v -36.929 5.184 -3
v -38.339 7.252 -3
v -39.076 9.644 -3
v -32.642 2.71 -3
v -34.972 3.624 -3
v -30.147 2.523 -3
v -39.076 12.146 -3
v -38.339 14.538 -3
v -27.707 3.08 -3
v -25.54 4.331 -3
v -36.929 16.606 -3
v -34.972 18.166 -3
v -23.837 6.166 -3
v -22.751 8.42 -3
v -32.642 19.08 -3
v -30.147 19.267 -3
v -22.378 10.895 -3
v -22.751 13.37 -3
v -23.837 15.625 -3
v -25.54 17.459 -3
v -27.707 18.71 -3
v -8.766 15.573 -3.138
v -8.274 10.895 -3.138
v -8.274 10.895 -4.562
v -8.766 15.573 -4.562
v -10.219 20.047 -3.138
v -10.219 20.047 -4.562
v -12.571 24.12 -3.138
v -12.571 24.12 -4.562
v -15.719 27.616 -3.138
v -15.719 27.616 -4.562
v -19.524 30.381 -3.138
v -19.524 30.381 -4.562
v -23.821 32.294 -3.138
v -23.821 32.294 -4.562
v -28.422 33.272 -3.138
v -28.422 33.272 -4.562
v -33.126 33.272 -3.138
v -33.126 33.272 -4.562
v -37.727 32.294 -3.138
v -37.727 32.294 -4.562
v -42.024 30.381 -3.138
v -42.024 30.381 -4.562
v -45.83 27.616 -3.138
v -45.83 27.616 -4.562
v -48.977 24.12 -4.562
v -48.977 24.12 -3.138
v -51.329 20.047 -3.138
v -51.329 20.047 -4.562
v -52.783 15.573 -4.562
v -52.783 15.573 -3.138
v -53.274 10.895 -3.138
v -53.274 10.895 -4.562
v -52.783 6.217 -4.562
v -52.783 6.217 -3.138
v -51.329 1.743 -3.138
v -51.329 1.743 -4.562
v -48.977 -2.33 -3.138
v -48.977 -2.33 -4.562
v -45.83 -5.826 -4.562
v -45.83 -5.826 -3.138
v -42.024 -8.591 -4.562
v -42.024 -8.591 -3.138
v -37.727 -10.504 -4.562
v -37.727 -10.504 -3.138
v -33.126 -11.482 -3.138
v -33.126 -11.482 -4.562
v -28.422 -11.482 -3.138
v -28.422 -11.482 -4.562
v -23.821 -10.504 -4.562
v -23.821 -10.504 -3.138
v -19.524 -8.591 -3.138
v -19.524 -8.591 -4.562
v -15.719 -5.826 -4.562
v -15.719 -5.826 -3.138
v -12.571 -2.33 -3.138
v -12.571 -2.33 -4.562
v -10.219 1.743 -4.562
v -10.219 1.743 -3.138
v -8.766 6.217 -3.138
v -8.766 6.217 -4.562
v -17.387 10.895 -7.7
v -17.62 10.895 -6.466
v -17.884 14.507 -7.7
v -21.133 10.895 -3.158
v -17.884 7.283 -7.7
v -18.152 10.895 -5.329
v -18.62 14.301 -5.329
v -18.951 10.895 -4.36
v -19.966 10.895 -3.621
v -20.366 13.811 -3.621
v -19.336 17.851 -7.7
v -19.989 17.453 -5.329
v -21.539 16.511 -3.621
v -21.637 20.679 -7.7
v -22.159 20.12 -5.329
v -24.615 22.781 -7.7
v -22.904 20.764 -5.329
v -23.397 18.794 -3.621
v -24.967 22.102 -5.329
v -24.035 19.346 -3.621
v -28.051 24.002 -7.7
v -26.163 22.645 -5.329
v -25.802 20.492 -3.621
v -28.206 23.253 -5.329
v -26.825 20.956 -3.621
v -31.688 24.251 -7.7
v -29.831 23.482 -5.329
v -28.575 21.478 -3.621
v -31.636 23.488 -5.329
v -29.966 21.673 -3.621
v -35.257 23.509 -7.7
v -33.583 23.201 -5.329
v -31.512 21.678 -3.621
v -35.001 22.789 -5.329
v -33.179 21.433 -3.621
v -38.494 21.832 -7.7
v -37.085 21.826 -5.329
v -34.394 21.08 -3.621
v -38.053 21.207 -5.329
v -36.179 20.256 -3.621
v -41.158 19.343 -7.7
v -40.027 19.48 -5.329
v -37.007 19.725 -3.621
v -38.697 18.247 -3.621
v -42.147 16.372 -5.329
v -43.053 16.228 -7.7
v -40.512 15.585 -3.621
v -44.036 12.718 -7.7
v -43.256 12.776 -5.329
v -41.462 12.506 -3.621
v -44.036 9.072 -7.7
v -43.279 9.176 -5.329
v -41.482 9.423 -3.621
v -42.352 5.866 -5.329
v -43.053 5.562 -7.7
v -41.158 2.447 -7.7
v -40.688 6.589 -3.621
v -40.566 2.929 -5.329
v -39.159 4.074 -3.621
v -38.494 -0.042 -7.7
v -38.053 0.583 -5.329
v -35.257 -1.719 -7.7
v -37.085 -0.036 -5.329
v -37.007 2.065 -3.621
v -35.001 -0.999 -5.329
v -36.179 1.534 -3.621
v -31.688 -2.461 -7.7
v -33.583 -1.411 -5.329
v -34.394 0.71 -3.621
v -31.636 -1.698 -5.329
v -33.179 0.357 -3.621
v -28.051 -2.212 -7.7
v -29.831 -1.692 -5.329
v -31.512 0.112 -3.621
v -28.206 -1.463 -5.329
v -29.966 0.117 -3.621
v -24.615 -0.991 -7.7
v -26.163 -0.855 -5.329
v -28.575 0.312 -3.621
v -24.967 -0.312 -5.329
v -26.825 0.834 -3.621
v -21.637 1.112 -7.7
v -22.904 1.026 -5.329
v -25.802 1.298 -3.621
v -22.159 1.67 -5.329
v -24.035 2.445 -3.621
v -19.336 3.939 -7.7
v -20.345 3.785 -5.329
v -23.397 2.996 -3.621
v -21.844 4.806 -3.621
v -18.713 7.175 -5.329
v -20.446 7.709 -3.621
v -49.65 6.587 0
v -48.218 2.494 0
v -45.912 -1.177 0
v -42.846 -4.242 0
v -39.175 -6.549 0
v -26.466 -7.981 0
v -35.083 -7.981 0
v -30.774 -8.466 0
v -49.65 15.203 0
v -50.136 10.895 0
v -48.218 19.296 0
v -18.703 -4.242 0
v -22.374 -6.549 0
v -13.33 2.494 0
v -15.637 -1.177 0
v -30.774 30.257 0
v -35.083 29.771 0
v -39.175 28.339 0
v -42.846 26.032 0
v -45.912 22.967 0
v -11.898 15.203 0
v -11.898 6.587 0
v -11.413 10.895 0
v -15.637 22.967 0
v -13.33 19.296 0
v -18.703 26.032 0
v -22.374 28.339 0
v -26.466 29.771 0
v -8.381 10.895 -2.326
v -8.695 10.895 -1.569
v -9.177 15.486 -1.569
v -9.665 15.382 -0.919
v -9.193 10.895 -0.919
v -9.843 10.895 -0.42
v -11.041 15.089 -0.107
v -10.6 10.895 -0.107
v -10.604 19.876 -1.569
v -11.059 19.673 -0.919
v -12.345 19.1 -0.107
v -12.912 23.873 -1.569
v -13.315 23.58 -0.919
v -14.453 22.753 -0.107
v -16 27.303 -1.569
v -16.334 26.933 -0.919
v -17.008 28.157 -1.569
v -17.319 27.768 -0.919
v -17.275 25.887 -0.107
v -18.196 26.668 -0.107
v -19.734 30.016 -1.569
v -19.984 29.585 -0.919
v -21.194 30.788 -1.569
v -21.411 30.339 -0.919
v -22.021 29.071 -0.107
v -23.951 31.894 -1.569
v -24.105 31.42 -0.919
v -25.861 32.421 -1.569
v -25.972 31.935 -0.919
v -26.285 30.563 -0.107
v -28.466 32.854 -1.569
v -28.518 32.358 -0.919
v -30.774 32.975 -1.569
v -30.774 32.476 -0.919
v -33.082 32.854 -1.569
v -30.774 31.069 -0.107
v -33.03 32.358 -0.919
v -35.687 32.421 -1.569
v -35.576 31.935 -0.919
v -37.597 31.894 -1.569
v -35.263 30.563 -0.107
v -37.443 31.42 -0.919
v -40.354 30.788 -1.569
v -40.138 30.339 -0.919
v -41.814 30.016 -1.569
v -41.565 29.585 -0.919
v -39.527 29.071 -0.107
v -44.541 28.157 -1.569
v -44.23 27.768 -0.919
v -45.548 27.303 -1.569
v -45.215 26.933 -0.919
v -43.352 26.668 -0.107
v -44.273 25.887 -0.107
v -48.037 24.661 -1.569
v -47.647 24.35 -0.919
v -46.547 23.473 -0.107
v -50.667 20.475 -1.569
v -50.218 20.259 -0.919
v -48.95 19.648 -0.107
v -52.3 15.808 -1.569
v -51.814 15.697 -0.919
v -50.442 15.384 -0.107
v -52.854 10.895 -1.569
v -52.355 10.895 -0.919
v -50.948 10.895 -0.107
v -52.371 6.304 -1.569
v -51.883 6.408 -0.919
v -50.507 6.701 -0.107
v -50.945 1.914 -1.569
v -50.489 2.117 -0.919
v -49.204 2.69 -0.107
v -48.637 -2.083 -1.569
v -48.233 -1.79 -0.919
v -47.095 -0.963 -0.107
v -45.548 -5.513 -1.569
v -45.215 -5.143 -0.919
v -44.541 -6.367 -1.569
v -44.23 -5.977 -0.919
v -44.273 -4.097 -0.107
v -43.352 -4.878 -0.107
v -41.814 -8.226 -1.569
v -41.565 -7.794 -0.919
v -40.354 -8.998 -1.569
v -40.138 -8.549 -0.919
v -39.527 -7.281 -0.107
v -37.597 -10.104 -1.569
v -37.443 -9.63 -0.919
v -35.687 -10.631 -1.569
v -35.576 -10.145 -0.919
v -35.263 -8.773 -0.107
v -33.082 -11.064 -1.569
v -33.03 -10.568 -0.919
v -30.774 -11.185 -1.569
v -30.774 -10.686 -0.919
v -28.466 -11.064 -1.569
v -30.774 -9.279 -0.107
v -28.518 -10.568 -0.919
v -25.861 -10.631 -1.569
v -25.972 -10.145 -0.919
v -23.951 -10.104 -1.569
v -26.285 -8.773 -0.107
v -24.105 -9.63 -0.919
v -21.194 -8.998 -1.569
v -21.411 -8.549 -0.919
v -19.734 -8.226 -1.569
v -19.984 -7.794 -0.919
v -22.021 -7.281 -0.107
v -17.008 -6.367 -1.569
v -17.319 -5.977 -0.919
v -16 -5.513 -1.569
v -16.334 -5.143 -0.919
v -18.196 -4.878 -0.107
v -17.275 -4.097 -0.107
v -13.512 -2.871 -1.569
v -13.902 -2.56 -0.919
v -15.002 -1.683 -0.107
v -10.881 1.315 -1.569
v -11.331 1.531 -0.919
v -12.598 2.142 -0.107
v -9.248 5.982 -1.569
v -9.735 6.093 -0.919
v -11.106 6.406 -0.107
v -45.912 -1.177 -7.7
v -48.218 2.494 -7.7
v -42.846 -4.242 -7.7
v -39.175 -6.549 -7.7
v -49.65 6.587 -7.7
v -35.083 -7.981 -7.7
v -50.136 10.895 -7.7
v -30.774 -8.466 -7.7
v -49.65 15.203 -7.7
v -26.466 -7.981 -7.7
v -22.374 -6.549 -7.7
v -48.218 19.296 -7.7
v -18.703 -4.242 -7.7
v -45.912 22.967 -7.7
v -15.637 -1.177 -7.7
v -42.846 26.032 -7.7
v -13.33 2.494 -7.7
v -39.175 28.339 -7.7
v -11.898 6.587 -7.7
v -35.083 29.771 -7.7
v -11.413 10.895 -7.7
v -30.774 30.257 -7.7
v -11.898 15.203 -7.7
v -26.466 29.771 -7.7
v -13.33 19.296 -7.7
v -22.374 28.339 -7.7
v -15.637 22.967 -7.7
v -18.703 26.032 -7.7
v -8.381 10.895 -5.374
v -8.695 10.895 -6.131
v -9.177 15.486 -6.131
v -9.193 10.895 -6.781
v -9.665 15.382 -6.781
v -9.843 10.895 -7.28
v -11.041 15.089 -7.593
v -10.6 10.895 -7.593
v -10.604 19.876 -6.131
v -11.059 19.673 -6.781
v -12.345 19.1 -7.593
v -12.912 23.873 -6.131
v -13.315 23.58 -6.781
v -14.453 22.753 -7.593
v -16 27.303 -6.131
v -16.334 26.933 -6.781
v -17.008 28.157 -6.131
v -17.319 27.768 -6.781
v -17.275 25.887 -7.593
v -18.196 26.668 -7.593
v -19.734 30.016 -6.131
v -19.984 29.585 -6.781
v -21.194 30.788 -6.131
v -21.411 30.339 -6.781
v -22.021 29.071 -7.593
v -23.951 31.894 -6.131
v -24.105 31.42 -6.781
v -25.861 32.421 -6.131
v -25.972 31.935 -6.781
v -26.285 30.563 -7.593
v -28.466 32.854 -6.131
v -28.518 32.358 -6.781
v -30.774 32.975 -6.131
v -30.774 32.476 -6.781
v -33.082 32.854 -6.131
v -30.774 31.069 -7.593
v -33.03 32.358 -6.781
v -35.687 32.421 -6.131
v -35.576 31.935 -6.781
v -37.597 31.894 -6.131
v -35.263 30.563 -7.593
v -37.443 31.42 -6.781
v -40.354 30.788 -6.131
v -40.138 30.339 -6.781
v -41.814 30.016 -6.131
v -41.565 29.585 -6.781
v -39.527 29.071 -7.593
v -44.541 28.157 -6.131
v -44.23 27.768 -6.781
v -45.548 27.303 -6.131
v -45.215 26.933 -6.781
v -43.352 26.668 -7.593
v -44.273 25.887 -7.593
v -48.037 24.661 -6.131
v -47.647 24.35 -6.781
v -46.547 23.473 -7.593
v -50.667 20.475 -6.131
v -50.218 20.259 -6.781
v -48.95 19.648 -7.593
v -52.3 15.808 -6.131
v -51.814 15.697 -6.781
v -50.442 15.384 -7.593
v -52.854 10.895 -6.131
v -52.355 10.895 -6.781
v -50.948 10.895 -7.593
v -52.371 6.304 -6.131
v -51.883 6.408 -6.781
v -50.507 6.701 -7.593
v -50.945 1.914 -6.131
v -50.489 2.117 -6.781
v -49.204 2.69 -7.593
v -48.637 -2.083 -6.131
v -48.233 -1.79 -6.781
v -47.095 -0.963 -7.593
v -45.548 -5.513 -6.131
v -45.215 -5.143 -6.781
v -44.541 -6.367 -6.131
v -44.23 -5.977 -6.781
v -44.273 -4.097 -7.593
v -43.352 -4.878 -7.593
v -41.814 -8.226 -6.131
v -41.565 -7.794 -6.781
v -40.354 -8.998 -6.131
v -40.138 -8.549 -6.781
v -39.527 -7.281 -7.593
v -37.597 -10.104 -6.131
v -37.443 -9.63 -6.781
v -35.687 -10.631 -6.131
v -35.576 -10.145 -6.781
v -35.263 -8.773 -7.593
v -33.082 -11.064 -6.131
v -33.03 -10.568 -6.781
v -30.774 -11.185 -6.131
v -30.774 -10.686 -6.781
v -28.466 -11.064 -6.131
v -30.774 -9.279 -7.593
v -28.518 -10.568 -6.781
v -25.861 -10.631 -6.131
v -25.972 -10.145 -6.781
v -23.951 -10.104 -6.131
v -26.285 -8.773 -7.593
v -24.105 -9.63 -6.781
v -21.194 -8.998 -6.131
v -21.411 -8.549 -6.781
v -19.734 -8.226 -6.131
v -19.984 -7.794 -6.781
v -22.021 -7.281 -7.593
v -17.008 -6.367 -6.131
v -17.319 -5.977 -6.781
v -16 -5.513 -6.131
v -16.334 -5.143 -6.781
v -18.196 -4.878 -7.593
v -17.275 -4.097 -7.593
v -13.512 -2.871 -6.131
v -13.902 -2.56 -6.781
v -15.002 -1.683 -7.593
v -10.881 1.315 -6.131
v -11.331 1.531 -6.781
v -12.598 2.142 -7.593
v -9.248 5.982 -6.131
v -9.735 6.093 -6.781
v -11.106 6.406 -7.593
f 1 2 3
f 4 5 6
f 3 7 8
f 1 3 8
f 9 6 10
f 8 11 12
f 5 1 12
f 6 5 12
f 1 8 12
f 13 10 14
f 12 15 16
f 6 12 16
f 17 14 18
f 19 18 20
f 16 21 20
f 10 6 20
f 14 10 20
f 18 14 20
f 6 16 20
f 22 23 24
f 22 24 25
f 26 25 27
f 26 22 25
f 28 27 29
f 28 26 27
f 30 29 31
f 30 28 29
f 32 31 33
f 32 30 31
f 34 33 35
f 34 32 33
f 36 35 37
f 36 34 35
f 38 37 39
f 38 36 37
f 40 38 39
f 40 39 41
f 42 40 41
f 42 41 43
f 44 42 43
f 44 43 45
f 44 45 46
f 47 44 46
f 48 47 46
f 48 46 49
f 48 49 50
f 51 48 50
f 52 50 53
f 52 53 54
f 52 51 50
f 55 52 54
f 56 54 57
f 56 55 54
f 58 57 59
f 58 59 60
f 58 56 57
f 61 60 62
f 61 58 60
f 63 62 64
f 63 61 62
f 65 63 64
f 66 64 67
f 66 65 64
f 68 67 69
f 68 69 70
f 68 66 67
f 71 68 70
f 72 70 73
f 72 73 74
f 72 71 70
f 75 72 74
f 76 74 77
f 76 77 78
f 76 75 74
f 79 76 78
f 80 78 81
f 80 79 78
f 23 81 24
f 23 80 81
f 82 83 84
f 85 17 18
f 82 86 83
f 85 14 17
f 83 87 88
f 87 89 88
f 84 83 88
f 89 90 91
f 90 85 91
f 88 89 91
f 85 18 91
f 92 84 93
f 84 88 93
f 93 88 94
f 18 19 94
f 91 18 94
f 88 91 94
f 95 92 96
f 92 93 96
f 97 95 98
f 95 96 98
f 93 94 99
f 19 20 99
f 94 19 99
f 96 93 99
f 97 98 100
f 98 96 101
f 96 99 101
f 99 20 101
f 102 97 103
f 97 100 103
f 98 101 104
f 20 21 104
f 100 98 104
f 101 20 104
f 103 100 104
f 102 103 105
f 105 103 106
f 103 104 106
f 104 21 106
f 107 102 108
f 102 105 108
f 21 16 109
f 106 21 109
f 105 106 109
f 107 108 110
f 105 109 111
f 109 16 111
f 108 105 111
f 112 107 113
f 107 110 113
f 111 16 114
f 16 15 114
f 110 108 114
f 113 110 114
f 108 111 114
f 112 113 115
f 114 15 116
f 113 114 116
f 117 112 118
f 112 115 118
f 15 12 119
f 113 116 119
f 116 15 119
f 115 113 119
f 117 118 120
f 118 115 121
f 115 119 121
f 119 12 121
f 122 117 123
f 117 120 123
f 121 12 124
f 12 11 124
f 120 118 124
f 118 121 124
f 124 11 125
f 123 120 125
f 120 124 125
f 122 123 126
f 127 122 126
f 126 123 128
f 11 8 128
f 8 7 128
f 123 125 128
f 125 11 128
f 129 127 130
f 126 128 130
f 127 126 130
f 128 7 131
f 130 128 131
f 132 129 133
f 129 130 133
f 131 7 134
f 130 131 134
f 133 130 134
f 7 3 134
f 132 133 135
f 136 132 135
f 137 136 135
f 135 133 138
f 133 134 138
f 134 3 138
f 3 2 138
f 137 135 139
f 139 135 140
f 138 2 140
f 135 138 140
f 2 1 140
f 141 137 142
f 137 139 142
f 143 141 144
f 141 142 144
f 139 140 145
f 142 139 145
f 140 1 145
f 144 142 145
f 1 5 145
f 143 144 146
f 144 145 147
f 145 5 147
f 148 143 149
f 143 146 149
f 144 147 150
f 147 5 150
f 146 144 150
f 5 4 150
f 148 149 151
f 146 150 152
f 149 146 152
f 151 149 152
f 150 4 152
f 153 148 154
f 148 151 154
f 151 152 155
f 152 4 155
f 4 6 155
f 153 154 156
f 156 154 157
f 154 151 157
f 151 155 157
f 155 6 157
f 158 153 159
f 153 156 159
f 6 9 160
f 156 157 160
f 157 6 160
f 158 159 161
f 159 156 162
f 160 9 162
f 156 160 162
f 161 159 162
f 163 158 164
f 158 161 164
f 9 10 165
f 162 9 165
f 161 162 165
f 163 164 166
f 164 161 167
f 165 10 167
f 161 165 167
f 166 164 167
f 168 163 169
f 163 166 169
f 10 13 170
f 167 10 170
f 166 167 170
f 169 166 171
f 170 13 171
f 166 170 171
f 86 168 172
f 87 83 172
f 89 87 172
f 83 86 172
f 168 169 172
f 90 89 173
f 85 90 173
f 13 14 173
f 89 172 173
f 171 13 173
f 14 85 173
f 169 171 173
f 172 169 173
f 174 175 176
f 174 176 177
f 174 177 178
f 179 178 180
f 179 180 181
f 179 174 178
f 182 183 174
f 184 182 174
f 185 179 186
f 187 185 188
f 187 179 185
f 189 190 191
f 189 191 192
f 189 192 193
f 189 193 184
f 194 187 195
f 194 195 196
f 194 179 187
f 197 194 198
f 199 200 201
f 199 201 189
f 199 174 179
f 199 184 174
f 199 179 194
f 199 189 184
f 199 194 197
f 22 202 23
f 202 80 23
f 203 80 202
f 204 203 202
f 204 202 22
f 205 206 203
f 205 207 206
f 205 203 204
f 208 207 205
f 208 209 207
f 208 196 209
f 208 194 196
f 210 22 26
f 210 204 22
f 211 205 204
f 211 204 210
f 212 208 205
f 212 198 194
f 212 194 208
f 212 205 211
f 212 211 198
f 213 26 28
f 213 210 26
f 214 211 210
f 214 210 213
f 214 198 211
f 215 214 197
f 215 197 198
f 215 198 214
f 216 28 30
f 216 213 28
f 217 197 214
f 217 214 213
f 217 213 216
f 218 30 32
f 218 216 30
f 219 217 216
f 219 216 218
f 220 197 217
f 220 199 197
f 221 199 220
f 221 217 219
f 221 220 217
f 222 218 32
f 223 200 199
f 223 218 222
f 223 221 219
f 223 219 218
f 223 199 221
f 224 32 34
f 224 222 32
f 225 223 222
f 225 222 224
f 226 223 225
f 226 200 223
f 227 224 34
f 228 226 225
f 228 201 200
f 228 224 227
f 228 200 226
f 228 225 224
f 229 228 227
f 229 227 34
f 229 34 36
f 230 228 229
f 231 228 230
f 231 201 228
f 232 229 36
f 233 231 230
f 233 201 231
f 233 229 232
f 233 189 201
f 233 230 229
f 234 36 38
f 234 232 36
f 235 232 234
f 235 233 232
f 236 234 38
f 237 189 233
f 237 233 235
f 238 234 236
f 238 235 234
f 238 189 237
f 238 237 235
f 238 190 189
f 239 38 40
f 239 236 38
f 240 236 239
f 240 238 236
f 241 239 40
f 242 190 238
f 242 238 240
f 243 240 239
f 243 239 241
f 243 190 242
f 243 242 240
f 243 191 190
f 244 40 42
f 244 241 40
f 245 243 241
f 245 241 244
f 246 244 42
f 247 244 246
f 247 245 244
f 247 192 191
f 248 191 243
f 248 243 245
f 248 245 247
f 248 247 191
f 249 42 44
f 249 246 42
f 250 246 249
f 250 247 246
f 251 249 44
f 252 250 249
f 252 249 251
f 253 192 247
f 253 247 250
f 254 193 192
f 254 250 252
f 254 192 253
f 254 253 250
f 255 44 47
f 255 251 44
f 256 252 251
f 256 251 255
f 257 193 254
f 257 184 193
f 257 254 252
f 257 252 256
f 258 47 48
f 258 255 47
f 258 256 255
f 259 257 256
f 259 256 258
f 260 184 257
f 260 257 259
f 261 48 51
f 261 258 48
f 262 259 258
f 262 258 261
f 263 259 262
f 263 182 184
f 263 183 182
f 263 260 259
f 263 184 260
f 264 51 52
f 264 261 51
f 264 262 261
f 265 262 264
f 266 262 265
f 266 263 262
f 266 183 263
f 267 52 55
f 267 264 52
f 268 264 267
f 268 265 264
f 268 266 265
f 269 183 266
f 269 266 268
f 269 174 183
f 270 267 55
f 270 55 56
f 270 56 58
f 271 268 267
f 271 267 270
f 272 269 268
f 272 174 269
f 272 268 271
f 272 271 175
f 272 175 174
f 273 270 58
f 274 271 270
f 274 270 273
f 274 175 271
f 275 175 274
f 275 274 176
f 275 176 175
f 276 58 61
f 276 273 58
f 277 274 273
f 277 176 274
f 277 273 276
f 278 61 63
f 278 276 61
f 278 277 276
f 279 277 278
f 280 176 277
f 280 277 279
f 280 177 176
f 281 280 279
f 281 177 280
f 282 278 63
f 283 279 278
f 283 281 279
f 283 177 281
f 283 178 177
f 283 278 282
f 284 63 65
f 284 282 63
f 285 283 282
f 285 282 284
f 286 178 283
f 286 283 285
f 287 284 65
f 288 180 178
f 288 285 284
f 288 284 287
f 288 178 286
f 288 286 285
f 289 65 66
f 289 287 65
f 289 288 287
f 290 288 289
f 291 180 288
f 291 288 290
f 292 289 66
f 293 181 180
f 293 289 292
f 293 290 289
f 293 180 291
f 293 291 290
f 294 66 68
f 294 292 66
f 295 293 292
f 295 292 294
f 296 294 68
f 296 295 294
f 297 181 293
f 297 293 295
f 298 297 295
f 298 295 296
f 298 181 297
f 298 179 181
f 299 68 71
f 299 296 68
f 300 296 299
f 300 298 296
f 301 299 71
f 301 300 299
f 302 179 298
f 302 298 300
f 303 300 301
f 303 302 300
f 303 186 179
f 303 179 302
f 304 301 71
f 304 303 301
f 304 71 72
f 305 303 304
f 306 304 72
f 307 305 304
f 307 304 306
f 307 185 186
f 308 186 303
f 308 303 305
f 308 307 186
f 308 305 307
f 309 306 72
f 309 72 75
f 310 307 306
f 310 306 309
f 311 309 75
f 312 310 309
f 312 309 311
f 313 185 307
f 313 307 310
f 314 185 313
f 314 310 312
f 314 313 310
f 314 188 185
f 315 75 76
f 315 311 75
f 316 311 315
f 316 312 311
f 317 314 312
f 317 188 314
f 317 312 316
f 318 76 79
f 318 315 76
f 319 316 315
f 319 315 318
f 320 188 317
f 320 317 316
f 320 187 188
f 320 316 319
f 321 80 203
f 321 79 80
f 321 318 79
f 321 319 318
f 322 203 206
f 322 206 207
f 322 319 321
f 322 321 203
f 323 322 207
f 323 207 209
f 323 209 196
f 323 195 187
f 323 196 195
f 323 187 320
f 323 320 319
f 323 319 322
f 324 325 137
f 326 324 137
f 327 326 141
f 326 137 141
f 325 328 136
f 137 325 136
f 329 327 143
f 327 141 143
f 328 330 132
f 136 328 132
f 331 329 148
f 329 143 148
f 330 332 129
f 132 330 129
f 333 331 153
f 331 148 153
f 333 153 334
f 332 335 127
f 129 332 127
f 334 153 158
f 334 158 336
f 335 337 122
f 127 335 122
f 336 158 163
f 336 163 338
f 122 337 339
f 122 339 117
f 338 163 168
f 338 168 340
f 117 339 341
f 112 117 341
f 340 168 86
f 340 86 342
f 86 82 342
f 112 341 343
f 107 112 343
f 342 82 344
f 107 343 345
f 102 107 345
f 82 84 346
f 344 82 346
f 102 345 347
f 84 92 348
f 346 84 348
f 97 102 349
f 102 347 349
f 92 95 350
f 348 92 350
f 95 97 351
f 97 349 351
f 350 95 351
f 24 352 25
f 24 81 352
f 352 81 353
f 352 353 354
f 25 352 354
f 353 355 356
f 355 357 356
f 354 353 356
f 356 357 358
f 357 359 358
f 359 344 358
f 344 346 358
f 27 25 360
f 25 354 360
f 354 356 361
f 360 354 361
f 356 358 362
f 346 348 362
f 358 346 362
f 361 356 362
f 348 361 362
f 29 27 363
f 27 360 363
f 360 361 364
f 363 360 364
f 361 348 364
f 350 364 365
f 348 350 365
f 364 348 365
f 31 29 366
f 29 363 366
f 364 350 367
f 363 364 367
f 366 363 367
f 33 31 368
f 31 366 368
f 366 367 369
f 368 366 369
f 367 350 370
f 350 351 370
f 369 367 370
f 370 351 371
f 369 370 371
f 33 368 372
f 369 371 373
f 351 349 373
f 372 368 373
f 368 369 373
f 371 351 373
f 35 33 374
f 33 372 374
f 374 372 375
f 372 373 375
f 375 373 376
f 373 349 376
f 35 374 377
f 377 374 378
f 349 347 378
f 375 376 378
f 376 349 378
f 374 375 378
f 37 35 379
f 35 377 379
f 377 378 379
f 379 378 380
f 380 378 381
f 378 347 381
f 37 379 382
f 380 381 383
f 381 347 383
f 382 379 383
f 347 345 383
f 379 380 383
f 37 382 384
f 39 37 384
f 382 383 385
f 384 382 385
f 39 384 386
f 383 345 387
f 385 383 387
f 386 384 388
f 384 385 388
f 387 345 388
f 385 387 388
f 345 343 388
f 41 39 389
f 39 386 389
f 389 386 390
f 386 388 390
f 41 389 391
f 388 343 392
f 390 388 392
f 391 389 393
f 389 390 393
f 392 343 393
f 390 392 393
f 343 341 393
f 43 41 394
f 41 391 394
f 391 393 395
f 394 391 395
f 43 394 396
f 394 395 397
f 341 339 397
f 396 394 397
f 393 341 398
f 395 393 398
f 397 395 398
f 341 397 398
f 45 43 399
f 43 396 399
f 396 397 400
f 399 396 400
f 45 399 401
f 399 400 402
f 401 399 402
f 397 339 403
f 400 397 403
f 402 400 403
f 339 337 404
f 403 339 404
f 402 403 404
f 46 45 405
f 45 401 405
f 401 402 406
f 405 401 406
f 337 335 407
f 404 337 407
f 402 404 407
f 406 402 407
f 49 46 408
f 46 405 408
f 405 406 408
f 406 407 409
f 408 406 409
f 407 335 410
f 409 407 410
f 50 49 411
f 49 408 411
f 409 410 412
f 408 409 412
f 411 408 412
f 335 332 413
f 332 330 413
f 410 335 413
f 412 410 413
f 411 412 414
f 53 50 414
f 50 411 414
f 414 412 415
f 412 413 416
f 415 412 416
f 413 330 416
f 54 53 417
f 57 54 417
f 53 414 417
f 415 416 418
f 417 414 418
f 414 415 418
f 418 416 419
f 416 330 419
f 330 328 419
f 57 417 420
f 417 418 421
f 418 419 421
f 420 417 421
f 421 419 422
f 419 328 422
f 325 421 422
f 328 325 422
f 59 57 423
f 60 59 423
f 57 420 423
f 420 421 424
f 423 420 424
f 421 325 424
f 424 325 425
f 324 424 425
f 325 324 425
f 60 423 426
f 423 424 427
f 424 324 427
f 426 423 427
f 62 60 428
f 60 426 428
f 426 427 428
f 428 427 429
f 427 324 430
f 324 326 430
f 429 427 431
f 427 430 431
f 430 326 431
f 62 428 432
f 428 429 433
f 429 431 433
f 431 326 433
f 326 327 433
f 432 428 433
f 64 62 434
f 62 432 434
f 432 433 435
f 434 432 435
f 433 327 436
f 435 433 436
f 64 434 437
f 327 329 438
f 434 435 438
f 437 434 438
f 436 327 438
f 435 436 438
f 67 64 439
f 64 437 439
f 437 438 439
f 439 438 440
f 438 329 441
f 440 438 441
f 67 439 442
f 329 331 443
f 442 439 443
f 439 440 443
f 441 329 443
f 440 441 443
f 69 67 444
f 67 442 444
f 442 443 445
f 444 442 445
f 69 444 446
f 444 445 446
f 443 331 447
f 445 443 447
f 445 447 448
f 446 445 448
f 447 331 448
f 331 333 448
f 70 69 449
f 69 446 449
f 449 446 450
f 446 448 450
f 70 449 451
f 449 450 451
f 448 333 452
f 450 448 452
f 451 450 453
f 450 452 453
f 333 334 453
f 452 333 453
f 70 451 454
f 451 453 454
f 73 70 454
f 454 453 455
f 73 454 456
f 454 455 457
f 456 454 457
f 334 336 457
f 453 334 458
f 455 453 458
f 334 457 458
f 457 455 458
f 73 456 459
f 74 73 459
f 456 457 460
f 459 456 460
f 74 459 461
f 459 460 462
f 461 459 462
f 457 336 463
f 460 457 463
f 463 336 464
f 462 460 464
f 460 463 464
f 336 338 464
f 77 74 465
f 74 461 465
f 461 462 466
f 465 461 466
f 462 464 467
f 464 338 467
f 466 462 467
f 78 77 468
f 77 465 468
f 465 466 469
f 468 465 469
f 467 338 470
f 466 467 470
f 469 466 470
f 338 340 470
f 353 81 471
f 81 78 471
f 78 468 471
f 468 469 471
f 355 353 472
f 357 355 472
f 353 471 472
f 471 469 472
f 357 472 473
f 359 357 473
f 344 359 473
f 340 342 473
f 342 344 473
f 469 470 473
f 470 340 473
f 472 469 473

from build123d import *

# Parameters (mm, degrees)
F0_R     = 22.5
F0_R_2   = 13.3867529453
F1_DEPTH = 7.7
F2_R     = 3.1384776311
F3_DEPTH = 3


# Not quite as in the source:
# - a fillet or chamfer that OpenCascade refuses, or shapes differently, is made with other operations: its cross-section is extruded or revolved along the edge and cut away or added


with BuildPart() as f1:
    # F0 (on Top) → F1 (new body)
    with BuildSketch(Plane.XY):
        with Locations((-30.7742264122, 10.8950231224)):
            Circle(F0_R)
        with Locations((-30.7742264122, 10.8950231224)):
            Circle(F0_R_2, mode=Mode.SUBTRACT)
    extrude(amount=-F1_DEPTH)

    # F2
    f2_edges = [f1.edges().sort_by_distance(p)[0] for p in [
        (-8.274226, 10.895023, -3.85),
        (-53.274226, 10.895023, 0),
        (-53.274226, 10.895023, -7.7),
    ]]
    fillet(f2_edges, radius=F2_R)

    # F0 (on Top) → F3 (join)
    with BuildSketch(Plane.XY):
        with Locations((-30.7742264122, 10.8950231224)):
            Circle(F0_R_2)
    extrude(amount=-F3_DEPTH)

    # F4: fillet of radius 5 on 1 edges, made by hand

    # F4_s1 → F4_t2 (revolve)
    with BuildSketch(Plane.XZ.offset(-10.8950231224)):
        with BuildLine():
            ThreePointArc((-17.3874734669, -7.7), (-18.9506380521, -4.3599450554), (-22.3784653523, -3))
            Line((-22.3784653523, -3), (-17.3874734669, -3))
            Line((-17.3874734669, -3), (-17.3874734669, -7.7))
        make_face()
    revolve(axis=Axis((-30.7742264122, 10.8950231224, -3), (0, 0, 1)))


solid = f1.part
